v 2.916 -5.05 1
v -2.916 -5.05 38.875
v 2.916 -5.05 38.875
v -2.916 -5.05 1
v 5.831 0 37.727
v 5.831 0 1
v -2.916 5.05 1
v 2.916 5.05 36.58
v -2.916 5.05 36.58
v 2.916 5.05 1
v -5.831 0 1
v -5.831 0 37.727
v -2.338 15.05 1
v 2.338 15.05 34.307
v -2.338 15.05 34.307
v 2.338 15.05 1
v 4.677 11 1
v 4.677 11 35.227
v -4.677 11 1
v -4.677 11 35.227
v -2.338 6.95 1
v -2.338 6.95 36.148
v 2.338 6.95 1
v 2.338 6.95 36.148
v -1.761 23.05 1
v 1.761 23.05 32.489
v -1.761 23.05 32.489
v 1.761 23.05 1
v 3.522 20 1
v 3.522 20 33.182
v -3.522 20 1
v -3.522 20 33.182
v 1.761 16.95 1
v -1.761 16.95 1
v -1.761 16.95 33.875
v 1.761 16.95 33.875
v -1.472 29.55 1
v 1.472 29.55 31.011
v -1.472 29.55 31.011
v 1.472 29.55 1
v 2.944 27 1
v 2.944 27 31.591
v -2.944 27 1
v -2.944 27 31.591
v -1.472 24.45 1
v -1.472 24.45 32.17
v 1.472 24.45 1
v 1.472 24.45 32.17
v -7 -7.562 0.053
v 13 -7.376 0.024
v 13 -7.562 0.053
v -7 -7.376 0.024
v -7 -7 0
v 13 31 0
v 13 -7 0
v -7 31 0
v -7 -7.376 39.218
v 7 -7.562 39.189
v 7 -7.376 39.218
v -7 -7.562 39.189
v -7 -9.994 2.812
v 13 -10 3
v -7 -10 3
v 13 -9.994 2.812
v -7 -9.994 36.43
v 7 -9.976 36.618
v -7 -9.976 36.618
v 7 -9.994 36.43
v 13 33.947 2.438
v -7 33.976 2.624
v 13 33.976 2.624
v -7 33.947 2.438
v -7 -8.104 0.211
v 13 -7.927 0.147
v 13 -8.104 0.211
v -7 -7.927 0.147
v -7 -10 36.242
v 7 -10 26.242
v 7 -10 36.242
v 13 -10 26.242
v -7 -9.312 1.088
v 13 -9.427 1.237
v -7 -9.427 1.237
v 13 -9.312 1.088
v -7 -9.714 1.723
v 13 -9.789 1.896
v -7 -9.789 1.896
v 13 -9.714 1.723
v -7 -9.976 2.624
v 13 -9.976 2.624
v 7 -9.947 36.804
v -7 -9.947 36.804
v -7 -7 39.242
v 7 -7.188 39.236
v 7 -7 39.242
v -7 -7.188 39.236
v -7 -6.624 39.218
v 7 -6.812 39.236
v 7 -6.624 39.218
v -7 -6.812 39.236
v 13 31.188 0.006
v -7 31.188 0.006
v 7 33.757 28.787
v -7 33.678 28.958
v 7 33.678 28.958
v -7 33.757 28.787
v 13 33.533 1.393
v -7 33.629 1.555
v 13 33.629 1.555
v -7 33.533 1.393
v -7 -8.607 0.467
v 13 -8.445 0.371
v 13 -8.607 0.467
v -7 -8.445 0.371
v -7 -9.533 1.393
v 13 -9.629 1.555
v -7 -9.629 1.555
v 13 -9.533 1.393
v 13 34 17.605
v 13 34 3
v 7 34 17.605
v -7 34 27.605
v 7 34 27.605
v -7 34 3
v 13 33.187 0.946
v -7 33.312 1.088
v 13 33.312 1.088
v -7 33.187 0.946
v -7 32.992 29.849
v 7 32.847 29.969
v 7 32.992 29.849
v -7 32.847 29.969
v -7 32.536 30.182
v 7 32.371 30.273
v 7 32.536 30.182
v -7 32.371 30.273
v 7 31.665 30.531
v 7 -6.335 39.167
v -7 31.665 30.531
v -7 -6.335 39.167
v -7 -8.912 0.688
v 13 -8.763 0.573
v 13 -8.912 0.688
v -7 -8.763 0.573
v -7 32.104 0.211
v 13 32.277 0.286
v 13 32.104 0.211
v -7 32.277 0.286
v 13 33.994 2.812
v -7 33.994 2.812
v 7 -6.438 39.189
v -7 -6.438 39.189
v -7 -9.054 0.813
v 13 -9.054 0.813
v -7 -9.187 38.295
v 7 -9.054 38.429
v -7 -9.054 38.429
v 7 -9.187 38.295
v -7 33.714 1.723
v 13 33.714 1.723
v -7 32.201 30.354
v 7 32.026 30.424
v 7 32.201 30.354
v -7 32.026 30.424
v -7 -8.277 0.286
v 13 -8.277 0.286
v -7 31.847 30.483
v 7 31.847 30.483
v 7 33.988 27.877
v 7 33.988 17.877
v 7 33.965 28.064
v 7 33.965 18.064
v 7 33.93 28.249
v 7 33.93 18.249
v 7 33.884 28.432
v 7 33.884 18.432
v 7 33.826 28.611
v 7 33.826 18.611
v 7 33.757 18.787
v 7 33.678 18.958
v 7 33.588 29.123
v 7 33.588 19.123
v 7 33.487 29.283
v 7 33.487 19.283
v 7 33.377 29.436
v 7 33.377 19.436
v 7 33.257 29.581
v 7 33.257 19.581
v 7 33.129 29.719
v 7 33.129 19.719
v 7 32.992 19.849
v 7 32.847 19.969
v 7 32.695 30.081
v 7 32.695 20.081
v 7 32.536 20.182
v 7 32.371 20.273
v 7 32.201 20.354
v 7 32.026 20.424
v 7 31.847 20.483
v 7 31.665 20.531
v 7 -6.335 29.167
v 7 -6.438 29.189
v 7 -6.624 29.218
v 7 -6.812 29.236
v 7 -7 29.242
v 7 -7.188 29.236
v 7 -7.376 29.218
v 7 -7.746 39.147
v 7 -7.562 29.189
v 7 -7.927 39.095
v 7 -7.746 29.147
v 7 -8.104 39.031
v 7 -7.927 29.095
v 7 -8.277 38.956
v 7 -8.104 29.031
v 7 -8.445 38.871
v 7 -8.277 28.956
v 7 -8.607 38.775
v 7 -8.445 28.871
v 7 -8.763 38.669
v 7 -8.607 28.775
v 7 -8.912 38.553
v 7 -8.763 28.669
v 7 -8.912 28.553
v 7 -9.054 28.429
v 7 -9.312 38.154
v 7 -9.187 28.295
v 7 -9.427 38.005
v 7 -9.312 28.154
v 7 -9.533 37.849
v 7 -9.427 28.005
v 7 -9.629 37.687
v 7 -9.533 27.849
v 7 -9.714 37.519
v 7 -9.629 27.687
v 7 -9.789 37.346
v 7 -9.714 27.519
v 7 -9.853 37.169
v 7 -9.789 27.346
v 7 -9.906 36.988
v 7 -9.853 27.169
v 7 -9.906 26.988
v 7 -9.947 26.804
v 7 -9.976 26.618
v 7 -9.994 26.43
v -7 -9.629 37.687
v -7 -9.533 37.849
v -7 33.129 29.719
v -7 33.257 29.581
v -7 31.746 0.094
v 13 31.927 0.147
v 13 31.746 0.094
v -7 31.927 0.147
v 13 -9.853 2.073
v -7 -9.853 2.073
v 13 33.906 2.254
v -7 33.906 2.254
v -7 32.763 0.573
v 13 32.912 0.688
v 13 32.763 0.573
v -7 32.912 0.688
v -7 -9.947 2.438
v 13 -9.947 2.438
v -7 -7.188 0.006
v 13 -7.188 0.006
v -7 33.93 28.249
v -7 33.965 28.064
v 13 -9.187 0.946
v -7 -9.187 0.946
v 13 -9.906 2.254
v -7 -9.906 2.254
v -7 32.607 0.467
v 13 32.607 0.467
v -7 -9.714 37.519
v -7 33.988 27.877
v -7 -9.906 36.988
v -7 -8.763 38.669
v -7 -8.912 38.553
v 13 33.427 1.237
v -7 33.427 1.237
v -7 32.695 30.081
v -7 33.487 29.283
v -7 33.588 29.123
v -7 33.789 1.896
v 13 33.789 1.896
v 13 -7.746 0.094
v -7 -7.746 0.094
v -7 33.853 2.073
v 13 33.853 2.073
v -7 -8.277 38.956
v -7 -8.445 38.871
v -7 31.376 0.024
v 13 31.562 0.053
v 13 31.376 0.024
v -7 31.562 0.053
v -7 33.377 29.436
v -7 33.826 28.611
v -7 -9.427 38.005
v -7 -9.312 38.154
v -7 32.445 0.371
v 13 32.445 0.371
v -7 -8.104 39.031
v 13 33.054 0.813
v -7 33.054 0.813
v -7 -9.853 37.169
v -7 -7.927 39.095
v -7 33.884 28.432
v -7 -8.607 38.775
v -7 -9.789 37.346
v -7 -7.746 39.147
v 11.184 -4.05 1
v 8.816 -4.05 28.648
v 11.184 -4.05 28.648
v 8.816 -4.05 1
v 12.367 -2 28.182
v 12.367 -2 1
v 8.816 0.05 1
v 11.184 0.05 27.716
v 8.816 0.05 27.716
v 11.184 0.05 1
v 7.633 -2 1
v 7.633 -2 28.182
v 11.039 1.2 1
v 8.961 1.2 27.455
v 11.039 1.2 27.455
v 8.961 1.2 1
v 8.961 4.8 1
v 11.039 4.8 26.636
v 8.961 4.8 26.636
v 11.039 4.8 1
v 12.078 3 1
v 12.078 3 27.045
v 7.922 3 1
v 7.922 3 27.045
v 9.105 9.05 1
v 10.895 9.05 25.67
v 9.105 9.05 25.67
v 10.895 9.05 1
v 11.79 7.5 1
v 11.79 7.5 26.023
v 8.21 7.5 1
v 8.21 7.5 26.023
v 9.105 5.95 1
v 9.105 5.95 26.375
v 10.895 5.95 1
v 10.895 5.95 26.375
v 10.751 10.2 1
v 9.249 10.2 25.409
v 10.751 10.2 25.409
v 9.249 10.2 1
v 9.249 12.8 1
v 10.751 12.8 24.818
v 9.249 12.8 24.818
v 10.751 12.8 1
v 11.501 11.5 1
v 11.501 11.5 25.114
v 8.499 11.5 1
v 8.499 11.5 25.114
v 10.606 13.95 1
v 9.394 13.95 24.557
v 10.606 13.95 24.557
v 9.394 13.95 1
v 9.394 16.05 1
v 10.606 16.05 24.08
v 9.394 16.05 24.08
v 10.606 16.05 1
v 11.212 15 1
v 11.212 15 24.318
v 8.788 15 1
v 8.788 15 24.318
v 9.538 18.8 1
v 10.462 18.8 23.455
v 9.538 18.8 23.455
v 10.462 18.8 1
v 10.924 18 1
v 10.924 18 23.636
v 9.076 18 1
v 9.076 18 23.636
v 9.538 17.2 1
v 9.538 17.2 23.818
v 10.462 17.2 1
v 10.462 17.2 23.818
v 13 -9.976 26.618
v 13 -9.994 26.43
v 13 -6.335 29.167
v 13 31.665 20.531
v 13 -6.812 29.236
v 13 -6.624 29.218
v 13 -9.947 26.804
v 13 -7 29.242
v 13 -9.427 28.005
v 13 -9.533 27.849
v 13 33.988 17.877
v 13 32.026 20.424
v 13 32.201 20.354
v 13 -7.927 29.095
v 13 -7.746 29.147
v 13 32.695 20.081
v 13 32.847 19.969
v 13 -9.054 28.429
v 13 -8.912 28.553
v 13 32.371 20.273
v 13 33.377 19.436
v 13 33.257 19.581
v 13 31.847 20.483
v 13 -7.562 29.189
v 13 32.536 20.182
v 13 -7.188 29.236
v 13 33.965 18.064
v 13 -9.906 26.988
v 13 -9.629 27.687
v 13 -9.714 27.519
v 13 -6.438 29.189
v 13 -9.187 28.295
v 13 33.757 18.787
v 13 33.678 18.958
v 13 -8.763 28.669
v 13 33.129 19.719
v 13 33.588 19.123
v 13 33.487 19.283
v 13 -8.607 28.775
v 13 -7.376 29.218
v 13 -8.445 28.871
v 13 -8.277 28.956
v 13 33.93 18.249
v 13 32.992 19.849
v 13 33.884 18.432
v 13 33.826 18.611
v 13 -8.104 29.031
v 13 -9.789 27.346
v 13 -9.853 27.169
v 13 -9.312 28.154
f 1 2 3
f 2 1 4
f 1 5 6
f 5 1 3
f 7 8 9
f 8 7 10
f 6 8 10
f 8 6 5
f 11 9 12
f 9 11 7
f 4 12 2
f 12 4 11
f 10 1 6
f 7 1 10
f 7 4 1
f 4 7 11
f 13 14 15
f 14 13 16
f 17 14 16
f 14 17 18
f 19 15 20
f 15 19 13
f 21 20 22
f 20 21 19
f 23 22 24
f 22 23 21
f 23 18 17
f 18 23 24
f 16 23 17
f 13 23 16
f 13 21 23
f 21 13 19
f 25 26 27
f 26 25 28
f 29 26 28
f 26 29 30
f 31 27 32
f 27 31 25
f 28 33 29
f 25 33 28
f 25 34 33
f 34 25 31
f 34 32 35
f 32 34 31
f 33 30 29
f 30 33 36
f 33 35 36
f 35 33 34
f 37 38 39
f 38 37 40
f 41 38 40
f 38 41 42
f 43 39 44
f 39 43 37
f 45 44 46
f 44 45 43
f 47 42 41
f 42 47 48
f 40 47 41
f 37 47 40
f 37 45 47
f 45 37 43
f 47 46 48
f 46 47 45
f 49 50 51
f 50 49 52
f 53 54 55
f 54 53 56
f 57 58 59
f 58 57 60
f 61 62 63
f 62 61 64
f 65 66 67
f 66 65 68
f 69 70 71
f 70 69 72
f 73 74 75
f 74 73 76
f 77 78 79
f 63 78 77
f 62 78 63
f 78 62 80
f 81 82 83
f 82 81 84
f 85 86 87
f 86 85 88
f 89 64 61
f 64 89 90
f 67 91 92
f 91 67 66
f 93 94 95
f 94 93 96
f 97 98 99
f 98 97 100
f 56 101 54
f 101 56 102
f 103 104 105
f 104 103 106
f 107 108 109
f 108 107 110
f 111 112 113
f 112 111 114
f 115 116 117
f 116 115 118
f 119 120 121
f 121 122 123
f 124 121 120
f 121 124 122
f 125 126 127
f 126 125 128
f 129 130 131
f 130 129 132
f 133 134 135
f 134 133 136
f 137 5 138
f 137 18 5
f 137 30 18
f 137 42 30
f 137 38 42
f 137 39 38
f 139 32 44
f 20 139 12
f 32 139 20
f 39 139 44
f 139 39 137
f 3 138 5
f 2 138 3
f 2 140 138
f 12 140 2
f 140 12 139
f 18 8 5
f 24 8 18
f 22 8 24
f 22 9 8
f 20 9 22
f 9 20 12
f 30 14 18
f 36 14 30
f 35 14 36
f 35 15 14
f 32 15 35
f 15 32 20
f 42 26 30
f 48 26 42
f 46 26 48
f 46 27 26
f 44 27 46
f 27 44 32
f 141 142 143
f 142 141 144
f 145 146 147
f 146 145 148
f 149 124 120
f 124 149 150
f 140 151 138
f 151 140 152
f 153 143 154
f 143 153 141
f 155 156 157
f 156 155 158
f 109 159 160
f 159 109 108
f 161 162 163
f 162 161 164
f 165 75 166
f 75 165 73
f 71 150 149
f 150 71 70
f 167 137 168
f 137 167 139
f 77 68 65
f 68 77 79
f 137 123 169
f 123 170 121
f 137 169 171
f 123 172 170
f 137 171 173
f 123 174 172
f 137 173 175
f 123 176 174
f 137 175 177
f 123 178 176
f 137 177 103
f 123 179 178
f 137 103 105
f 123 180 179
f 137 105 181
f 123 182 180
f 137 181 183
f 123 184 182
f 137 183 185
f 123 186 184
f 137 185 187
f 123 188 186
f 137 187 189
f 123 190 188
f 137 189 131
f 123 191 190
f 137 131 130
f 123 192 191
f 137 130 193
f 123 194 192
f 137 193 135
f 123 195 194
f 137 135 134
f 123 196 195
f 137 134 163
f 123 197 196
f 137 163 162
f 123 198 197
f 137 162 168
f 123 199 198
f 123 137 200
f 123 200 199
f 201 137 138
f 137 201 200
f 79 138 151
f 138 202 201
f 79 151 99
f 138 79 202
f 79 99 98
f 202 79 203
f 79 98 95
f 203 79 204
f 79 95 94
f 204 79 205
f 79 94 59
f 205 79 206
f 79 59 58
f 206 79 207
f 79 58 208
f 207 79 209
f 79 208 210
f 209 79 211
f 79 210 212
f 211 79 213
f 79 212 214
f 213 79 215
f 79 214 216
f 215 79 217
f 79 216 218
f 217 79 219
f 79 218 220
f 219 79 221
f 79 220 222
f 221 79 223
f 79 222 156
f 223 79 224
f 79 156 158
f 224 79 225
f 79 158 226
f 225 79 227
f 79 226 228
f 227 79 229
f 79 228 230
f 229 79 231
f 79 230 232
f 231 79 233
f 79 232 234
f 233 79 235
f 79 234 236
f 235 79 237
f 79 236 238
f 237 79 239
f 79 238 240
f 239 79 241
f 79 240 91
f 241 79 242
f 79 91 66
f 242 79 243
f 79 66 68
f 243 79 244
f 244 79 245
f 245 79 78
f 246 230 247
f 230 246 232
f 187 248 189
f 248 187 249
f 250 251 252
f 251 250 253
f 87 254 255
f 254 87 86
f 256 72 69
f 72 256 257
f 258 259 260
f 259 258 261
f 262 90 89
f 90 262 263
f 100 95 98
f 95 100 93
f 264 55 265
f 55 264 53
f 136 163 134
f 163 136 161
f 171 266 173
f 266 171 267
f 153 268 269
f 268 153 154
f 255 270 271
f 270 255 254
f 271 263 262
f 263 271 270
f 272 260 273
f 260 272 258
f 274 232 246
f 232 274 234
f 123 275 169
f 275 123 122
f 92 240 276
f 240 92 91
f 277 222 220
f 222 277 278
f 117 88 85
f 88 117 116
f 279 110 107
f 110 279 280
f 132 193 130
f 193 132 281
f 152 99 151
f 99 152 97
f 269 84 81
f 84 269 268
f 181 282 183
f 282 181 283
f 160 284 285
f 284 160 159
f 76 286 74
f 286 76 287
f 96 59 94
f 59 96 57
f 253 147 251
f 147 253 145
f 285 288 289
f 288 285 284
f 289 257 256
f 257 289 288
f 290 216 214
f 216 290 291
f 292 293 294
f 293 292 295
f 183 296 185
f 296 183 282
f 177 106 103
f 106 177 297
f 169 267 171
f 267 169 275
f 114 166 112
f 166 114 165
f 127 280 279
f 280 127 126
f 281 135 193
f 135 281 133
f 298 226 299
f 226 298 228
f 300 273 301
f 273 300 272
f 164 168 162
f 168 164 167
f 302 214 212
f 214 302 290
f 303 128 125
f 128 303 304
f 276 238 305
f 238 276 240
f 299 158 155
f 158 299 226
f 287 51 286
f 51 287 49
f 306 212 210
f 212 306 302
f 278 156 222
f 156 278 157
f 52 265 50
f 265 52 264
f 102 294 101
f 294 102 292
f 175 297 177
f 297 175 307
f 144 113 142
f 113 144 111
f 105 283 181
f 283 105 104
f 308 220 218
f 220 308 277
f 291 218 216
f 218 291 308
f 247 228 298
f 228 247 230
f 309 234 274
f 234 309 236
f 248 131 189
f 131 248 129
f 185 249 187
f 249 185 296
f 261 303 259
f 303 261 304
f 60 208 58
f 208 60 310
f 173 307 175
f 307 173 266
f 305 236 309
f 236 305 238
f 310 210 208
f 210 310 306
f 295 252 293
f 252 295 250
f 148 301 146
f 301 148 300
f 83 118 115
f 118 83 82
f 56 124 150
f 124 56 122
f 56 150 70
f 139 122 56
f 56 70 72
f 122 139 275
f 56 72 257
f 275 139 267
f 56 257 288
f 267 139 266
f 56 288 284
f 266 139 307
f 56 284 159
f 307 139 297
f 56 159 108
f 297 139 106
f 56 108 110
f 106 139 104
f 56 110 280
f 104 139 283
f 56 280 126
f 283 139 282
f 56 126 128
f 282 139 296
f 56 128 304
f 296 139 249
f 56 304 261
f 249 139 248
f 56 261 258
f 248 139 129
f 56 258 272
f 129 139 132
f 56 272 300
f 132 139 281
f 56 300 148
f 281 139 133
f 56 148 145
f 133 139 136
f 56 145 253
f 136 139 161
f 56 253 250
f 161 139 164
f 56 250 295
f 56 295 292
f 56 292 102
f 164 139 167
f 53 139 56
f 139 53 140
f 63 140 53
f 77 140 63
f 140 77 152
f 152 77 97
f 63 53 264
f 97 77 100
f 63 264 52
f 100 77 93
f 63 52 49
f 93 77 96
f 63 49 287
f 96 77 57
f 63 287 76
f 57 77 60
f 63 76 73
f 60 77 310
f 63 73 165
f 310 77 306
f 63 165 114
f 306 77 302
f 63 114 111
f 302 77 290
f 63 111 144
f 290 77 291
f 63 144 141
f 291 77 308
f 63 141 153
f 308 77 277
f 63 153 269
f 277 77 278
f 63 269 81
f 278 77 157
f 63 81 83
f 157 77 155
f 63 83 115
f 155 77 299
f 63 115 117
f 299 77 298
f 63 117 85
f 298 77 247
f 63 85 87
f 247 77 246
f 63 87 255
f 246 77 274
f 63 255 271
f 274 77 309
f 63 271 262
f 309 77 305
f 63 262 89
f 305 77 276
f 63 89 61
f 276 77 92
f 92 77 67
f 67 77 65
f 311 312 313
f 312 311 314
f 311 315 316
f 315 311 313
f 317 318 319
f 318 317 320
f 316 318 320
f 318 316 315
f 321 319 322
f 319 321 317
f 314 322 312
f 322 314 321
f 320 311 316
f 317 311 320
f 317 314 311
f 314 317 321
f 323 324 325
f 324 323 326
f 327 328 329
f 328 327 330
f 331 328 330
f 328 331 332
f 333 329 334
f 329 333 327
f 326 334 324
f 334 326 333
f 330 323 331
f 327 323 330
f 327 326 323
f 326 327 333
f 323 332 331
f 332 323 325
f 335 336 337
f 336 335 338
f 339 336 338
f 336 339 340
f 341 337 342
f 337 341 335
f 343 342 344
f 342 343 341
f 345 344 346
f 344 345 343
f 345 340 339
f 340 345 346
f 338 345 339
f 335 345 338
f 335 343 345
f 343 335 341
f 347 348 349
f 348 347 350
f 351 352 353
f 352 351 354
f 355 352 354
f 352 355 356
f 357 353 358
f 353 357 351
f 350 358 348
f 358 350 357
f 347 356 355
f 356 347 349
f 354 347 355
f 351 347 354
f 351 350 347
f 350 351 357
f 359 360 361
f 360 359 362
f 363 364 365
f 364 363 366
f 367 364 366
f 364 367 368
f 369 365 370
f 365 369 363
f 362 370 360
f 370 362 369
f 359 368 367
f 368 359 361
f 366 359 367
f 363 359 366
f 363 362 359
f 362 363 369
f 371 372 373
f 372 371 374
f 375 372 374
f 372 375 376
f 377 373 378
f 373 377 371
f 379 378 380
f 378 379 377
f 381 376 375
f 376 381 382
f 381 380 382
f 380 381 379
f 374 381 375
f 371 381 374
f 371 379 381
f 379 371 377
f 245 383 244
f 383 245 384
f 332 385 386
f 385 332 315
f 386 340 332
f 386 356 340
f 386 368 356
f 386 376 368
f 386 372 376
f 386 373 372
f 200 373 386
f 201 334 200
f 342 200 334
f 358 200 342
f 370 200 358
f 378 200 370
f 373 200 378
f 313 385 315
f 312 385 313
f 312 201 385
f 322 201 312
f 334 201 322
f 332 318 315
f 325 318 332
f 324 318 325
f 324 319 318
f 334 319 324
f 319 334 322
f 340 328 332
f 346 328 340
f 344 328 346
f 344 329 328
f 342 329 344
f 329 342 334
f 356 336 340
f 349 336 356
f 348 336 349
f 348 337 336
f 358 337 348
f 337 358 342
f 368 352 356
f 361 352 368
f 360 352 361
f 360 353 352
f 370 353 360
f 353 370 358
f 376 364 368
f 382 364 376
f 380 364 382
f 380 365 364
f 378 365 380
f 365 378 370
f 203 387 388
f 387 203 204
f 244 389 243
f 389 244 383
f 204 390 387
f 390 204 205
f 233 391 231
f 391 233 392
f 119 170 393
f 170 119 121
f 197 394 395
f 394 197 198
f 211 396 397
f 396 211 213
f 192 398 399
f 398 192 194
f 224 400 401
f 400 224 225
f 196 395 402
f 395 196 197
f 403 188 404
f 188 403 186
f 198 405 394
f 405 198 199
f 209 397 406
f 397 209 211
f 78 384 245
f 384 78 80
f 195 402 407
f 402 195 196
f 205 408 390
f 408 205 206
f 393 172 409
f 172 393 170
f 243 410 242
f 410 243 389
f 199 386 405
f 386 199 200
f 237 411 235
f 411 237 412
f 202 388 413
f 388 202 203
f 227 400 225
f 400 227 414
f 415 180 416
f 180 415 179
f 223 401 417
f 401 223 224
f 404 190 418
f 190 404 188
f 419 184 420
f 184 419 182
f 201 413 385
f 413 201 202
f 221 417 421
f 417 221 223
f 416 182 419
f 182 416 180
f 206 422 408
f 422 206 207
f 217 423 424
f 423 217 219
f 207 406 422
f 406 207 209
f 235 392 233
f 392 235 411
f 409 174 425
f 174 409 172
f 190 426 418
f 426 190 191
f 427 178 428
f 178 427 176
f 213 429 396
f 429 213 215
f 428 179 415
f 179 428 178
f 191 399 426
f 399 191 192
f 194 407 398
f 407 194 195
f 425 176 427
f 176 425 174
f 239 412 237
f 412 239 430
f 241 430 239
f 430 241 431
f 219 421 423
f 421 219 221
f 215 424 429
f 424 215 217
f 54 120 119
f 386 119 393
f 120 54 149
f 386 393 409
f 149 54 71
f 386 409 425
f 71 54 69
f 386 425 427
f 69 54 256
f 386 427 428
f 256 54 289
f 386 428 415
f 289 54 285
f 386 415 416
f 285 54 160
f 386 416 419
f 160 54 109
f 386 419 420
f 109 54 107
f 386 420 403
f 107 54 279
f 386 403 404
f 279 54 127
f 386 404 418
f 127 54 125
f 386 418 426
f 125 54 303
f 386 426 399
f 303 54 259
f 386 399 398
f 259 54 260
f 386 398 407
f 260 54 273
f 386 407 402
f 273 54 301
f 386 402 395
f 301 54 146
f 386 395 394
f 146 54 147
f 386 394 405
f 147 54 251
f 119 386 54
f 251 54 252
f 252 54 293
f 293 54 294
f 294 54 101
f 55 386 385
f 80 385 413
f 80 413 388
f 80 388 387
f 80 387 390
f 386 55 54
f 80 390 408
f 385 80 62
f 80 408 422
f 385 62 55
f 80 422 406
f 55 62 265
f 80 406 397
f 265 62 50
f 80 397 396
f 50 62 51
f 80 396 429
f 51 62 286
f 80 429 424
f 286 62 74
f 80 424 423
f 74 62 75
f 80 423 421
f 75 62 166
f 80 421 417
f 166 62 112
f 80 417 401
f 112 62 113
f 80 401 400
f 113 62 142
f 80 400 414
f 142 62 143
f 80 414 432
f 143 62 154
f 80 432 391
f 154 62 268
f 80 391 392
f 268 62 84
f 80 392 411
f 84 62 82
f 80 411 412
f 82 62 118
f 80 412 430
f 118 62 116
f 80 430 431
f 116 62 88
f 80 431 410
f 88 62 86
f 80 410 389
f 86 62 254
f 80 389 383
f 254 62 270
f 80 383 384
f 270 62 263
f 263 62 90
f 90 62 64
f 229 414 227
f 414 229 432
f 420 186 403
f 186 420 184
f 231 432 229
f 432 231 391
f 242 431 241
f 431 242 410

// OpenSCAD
sizes1 = [10, 8, 6, 5];
sizes2 = [4, 3.5, 3, 2.5, 2, 1.5];

fit = 0.1;

$fn = 100;

difference() {
    translate([10/2+2, -10/2-5, 0]) rotate([0,-90,0])
        linear_extrude(height = 10+2*2)
        offset(r=3) offset(delta=-3)
        polygon([[0,0], [30+10,0], [20+10, 10+8+6+5+(10+5)], [0, 10+8+6+5+(10+5)]]);
    translate([0, 0, 1]) hole(sizes1);
}
difference() {
    translate([10+3, -10/2-5, 0]) rotate([0,-90,0])
        linear_extrude(height = 4+2)
        offset(r=3) offset(delta=-3)
        difference() {
            polygon([[0,0], [30,0], [20, 10+8+6+5+(10+5)], [0, 10+8+6+5+(10+5)]]);
            //polygon([[0,0+35], [30,0+35], [20, 10+8+6+5+(10+5)], [0, 10+8+6+5+(10+5)]]);
        }
    translate([10, -2, 1]) hole(sizes2);
}
module hole(l) for(x = [for(i = [0 : len(l) - 1]) [i, l[i]]]) {
    y = (sum(select(l, [0 : x[0]-1]))+1*x[0]);
    translate([0, y, 0]) hex_key(d=x[1]+fit, h=80);
}

module hex_key(d,h) cylinder(r=d/sqrt(3), h=h, $fn=6);

function sum(v) = [for(p=v) 1]*v;
function select(vector,indices) = [ for (index = indices) vector[index] ];
